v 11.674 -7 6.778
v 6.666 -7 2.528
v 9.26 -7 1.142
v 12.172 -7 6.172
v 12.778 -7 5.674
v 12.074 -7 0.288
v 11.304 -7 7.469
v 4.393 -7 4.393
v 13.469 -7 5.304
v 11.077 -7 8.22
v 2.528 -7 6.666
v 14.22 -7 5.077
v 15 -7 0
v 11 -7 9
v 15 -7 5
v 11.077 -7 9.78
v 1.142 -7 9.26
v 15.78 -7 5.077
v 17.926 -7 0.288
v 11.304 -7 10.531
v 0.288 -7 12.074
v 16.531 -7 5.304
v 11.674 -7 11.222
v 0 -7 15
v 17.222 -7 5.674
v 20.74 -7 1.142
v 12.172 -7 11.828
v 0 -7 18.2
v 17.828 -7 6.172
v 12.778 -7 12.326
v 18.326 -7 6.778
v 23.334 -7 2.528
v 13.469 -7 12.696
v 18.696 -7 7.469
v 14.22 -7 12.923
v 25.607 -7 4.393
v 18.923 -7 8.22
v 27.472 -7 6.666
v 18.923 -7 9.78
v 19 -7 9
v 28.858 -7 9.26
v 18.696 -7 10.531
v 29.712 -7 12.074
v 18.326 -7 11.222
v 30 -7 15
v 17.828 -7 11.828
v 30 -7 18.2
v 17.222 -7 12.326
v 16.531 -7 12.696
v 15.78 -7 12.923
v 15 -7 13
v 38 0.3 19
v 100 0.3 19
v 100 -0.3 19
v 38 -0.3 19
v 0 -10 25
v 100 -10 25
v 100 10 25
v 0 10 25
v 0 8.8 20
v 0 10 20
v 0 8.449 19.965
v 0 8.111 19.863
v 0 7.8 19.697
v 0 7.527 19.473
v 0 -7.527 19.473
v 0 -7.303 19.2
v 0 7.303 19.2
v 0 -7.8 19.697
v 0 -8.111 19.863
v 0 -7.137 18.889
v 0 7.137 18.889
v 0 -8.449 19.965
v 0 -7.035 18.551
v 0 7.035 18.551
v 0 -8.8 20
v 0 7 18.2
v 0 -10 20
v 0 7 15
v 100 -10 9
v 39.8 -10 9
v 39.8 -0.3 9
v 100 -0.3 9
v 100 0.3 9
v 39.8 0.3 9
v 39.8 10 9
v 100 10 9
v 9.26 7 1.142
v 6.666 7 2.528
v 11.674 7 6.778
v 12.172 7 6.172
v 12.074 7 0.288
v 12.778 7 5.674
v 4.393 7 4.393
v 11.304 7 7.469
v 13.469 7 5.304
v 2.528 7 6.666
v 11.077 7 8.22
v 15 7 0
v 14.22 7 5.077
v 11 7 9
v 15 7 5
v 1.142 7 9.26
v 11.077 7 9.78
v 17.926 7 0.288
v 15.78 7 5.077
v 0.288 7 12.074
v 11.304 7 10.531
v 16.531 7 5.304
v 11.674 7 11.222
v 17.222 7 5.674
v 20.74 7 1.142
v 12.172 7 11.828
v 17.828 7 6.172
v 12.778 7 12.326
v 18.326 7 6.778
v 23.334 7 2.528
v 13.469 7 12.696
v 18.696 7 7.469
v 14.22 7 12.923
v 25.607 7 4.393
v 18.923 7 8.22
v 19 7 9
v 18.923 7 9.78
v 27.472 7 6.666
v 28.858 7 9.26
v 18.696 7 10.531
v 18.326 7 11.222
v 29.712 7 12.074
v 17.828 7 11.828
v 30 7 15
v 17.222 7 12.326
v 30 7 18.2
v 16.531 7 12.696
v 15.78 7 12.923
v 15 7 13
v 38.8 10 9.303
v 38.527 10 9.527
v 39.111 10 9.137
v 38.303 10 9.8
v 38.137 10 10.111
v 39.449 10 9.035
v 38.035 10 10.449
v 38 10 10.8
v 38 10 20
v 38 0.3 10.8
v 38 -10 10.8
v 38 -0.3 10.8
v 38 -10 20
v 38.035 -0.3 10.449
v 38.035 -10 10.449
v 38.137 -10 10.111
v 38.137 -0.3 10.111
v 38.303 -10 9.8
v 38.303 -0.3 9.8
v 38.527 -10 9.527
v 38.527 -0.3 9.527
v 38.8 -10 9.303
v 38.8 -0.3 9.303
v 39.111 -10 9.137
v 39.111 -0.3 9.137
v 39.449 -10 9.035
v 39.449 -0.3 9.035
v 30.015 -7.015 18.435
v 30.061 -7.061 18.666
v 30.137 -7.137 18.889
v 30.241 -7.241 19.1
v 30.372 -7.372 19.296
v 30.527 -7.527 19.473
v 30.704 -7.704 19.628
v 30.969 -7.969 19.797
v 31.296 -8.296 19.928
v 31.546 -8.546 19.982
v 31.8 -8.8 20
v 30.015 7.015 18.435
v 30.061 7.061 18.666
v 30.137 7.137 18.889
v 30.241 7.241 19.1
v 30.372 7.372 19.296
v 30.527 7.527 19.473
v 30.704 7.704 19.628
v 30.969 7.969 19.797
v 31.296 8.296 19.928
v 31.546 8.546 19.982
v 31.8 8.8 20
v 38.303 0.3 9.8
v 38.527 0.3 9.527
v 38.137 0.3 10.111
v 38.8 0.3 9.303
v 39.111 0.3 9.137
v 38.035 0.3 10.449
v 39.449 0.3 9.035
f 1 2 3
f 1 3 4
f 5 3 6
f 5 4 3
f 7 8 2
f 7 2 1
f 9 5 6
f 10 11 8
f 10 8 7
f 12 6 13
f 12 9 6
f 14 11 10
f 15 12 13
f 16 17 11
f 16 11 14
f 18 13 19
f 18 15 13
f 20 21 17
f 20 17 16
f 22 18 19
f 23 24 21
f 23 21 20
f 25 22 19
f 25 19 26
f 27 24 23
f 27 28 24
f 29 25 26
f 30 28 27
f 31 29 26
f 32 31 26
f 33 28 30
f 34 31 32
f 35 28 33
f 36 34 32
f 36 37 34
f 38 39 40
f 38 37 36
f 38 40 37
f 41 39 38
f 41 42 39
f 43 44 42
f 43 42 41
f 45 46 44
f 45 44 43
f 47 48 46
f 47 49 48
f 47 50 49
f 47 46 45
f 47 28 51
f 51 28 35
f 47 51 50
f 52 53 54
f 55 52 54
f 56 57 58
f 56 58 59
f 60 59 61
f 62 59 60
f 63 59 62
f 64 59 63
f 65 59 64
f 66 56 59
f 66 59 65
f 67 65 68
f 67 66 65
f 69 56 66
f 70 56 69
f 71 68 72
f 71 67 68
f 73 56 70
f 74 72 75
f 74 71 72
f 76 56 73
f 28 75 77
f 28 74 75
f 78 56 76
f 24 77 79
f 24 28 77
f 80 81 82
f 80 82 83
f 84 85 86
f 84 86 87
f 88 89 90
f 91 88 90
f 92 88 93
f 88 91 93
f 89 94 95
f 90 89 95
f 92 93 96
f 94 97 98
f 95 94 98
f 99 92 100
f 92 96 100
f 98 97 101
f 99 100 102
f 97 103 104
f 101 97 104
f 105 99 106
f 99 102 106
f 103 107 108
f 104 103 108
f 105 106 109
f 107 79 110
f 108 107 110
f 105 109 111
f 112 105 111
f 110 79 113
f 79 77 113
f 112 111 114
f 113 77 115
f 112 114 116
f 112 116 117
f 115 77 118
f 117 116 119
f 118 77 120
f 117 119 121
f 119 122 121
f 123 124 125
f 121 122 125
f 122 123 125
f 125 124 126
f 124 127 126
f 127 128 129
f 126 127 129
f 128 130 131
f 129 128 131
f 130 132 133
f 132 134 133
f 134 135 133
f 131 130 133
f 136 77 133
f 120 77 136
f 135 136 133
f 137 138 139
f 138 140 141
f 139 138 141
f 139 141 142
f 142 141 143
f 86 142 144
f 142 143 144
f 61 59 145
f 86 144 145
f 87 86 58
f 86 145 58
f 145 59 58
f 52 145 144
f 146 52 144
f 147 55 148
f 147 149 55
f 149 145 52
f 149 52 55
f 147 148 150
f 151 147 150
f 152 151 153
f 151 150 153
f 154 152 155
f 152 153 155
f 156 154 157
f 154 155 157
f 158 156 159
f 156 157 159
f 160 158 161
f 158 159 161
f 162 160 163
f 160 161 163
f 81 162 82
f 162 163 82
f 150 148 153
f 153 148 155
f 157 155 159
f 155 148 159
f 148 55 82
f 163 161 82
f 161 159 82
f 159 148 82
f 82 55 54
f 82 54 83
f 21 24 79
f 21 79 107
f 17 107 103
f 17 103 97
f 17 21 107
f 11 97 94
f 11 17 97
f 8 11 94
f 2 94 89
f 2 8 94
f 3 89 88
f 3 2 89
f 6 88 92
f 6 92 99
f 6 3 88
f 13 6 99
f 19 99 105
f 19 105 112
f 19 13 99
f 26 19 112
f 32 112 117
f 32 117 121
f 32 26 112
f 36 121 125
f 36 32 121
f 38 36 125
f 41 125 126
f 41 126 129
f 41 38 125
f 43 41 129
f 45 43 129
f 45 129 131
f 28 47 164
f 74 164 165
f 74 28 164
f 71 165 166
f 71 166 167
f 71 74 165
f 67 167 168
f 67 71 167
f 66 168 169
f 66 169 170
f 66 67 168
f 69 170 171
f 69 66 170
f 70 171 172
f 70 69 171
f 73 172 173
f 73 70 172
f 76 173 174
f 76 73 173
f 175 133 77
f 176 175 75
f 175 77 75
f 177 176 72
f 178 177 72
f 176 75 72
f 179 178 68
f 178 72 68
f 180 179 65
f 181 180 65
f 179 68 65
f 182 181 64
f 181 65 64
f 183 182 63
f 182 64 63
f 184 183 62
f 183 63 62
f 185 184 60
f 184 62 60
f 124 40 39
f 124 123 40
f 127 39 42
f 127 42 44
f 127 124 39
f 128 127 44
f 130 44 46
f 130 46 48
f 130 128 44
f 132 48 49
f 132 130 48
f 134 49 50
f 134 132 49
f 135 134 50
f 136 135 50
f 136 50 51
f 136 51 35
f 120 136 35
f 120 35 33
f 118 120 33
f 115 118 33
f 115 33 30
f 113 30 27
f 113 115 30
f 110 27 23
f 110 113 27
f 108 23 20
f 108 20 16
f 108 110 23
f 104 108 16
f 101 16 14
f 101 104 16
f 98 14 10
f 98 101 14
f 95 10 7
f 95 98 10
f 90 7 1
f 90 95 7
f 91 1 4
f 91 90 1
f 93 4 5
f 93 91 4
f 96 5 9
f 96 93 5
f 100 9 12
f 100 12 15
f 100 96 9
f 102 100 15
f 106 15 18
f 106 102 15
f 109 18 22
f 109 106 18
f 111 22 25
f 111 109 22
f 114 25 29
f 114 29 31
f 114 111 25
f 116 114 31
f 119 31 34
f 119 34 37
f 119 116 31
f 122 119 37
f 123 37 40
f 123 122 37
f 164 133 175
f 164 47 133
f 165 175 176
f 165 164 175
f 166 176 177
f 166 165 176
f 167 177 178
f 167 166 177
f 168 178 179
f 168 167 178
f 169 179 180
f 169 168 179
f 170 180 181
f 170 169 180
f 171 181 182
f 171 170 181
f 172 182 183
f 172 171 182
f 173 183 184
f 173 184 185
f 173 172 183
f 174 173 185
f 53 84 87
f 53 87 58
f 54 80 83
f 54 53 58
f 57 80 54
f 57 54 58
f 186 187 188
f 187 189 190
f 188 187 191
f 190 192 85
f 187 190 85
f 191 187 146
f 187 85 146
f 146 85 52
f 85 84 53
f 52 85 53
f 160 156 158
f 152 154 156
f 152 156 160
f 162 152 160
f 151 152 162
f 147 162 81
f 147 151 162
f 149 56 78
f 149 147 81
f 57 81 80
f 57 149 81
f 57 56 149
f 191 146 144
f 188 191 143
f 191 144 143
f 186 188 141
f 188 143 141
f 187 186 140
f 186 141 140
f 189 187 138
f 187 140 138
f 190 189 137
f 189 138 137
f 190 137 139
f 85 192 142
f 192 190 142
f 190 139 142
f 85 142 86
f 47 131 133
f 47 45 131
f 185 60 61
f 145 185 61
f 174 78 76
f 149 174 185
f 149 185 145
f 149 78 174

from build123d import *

# Parameters (mm, degrees)
F1_DEPTH = 10
F0_R     = 4
F2_DEPTH = 7
F3_R     = 1.8
F6_DEPTH = 65


with BuildPart() as f1:
    # F0 (on Front) → F1 (new body, symmetric)
    with BuildSketch(Plane.XZ):
        Polygon((100, 25), (0, 25), (0, 20), (30, 20), (38, 20), (38, 9), (100, 9), align=None)
    extrude(amount=F1_DEPTH, both=True)

    # F0 (on Front) → F2 (join, symmetric)
    with BuildSketch(Plane.XZ):
        Polygon((100, 25), (0, 25), (0, 20), (30, 20), (38, 20), (38, 9), (100, 9), align=None)
        with BuildLine():
            Line((30, 20), (0, 20))
            Line((0, 20), (0, 15))
            ThreePointArc((0, 15), (15, 0), (30, 15))
            Line((30, 15), (30, 20))
        make_face()
        with Locations((15, 9)):
            Circle(F0_R, mode=Mode.SUBTRACT)
    extrude(amount=F2_DEPTH, both=True)

    # F3
    f3_edges = [f1.edges().sort_by_distance(p)[0] for p in [
        (30, 0, 20),
        (15, -7, 20),
        (15, 7, 20),
        (38, 0, 9),
    ]]
    fillet(f3_edges, radius=F3_R)

    # F5 (on offset) → F6 (cut)
    with BuildSketch(Plane.YZ.offset(100)):
        Polygon((-0.3, 9), (0, 9), (0.3, 9), (0.3, 19), (-0.3, 19), align=None)
    extrude(amount=-F6_DEPTH, mode=Mode.SUBTRACT)


solid = f1.part
